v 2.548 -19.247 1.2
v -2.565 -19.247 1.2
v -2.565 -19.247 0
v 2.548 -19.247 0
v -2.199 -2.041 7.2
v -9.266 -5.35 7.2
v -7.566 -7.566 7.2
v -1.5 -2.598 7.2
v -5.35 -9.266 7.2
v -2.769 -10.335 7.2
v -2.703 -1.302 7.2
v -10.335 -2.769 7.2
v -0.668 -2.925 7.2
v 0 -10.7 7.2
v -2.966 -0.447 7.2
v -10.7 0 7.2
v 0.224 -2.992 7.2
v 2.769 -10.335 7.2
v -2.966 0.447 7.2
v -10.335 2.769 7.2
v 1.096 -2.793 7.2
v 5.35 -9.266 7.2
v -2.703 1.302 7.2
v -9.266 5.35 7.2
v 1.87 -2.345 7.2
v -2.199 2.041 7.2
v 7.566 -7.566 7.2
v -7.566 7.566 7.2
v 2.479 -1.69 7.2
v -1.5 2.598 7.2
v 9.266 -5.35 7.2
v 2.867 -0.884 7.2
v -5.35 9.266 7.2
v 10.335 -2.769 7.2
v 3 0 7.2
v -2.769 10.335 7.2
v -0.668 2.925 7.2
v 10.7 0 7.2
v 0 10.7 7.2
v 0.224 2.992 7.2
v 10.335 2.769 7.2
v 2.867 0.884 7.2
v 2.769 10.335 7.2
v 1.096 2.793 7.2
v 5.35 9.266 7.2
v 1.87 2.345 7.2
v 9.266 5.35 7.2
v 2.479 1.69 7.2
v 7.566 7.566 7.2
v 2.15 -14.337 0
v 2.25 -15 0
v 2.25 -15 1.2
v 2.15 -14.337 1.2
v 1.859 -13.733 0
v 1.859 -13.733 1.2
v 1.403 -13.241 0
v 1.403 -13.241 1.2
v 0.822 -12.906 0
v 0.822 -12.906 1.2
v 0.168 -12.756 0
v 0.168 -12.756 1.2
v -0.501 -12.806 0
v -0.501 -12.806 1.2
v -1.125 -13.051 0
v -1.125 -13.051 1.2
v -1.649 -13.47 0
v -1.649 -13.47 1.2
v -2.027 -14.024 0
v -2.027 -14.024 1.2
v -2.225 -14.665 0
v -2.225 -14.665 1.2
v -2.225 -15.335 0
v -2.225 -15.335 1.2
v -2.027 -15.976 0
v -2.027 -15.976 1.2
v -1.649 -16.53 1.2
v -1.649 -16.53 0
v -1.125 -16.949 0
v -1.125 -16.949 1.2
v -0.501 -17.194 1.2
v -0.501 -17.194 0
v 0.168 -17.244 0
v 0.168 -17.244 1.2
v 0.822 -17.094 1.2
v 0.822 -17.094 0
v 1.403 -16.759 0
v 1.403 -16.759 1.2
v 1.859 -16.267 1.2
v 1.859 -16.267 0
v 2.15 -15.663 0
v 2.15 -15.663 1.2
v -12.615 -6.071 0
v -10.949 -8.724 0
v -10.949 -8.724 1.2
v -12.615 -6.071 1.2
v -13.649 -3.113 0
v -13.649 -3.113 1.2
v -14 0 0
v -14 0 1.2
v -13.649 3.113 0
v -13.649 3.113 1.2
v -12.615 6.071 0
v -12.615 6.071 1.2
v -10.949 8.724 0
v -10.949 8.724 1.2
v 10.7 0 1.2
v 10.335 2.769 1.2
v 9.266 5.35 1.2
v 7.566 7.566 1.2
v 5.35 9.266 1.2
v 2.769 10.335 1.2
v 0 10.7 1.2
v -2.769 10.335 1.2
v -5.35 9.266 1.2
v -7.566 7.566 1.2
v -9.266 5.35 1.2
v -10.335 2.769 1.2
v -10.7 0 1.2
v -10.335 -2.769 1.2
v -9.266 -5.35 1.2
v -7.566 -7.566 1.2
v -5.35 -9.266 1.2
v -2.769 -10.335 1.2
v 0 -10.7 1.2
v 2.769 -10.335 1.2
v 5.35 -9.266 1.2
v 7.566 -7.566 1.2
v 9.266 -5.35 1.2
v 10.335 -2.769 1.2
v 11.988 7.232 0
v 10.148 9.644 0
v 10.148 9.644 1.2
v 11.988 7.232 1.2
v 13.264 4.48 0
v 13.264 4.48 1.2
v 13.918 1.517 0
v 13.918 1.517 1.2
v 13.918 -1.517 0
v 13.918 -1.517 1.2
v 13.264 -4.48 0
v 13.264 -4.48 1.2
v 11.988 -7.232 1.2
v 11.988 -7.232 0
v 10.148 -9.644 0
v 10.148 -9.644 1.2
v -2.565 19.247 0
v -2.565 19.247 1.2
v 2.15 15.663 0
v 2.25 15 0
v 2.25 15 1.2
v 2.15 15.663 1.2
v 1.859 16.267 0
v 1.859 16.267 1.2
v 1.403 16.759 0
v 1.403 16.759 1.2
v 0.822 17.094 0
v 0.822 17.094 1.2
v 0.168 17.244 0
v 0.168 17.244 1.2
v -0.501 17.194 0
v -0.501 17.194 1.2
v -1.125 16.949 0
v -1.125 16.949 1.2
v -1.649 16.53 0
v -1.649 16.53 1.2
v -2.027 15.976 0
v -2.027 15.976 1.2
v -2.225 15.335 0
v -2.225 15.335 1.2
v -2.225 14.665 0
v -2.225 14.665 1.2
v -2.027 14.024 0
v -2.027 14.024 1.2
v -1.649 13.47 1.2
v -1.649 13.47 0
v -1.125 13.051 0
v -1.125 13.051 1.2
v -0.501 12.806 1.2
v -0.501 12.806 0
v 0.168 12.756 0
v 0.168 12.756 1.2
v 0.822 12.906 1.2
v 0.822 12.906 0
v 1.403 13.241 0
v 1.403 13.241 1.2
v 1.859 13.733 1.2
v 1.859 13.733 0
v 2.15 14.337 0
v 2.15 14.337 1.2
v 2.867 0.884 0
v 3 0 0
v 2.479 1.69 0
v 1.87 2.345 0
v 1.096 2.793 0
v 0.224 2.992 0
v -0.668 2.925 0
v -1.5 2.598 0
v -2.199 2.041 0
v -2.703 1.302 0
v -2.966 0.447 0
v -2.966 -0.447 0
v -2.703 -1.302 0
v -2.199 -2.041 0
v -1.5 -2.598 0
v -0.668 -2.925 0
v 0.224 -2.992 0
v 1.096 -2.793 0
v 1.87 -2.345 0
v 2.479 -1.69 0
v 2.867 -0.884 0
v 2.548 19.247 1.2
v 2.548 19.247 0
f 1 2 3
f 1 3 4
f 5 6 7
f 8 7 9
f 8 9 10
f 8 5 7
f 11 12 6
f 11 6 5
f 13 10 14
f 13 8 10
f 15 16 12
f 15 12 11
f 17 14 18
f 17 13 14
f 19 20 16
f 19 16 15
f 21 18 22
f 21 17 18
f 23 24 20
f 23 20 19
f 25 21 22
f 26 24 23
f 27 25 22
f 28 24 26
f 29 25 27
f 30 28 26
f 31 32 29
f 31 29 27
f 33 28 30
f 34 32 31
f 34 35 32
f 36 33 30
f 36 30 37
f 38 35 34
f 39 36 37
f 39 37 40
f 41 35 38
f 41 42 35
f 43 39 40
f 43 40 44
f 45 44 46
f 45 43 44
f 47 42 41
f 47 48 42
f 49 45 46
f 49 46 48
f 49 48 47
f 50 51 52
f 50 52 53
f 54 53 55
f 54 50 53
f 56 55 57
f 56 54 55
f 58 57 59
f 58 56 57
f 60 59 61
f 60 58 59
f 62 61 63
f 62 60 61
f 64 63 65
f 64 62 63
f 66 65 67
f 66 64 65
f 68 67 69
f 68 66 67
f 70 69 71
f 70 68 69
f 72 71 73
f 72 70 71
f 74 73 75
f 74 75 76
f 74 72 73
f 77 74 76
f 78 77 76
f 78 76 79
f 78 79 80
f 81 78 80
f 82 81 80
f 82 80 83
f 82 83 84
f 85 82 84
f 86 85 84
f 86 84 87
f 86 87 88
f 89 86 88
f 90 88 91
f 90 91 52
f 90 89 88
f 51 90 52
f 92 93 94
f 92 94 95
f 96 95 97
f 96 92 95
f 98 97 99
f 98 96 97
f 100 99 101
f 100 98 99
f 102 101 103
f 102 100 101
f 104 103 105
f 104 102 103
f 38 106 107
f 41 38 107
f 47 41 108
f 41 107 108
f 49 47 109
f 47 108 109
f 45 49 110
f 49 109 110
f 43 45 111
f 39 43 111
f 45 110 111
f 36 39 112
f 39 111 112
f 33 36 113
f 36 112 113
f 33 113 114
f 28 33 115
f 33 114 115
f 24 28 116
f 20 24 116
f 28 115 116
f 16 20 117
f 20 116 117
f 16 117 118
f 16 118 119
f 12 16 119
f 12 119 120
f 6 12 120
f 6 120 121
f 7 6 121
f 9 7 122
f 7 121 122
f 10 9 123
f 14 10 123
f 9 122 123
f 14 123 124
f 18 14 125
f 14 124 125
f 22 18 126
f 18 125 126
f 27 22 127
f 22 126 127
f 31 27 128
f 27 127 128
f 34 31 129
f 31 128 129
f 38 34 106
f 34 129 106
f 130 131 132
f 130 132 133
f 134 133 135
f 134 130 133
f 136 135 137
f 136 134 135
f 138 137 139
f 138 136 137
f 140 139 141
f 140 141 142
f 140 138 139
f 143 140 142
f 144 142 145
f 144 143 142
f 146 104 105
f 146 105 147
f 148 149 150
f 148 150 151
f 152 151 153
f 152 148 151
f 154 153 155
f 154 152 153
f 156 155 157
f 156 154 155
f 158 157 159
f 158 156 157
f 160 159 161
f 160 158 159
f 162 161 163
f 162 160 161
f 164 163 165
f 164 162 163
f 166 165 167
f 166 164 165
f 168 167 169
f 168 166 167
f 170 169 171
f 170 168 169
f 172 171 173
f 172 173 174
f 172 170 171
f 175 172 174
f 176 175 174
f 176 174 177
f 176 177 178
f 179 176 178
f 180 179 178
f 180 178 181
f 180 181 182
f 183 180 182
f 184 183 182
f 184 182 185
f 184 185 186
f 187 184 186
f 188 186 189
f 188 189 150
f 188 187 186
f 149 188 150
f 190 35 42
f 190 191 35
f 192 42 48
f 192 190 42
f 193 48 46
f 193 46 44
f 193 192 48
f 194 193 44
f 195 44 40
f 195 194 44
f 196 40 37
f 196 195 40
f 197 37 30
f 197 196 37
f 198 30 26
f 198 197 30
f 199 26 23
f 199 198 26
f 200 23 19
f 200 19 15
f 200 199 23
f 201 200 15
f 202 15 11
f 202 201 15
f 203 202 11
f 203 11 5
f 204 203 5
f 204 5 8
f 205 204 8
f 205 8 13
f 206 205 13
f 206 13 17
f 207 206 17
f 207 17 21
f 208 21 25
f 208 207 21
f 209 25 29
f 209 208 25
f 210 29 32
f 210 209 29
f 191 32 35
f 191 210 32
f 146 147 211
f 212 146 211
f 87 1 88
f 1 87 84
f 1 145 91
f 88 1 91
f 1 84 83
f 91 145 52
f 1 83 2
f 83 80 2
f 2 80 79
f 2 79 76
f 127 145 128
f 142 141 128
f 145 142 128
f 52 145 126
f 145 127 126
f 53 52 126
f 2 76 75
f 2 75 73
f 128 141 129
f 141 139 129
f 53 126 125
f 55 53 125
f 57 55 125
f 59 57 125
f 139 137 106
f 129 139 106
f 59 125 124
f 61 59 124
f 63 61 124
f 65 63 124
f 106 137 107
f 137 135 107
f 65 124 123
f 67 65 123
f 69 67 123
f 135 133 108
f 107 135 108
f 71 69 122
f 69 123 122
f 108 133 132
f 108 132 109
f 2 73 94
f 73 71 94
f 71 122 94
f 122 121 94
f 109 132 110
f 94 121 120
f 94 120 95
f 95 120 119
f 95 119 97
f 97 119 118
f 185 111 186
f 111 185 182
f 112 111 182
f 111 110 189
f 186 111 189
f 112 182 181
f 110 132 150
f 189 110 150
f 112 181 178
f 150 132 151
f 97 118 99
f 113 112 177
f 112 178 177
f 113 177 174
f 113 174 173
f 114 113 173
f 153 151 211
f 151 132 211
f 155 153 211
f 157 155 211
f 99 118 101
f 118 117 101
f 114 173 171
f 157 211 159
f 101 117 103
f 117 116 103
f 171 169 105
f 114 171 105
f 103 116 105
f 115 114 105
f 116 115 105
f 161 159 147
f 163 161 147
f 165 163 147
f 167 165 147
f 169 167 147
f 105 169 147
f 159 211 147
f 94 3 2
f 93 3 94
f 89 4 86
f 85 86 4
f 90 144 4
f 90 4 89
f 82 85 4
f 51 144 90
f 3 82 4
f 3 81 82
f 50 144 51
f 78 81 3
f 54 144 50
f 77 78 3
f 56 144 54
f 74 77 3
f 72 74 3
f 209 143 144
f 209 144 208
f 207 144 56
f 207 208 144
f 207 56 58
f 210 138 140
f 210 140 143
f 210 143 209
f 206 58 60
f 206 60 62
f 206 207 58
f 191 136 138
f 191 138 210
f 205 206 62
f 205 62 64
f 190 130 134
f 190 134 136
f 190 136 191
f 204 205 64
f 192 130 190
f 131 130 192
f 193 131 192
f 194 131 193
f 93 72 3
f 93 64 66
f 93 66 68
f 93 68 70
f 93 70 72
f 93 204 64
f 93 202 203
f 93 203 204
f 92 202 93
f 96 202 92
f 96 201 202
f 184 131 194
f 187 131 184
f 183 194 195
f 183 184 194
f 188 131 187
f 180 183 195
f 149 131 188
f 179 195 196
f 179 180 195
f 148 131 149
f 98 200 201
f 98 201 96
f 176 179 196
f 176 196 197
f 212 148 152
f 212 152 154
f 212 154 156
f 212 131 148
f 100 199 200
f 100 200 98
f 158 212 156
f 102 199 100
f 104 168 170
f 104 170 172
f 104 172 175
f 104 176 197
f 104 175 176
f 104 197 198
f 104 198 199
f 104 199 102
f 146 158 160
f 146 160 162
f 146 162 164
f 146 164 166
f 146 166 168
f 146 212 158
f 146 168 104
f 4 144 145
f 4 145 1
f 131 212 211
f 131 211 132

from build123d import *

# Parameters (mm, degrees)
SKETCH_1_R          = 2.25
SKETCH_1_R_2        = 3
EXTRUDE_1_DEPTH     = 1.2
SKETCH_2_R          = 10.7
SKETCH_2_R_2        = 3
EXTRUDE_2_DEPTH     = 6
CUT_EXTRUDE_1_DEPTH = 6


with BuildPart() as part:
    # ｽｹｯﾁ1 → ﾎﾞｽ - 押し出し1 (new body)
    with BuildSketch(Plane.XY):
        with BuildLine():
            Line((-10.949386038, 8.724158721), (0, 22.466349623))
            Line((0, 22.466349623), (10.148136548, 9.644445272))
            ThreePointArc((10.148136548, 9.644445272), (14, 0), (10.148136548, -9.644445272))
            Line((10.148136548, -9.644445272), (0, -22.466349623))
            Line((0, -22.466349623), (-10.949386038, -8.724158721))
            ThreePointArc((-10.949386038, -8.724158721), (-14, 0), (-10.949386038, 8.724158721))
        make_face()
        with Locations((0, 15)):
            Circle(SKETCH_1_R, mode=Mode.SUBTRACT)
        with Locations((0, -15)):
            Circle(SKETCH_1_R, mode=Mode.SUBTRACT)
        Circle(SKETCH_1_R_2, mode=Mode.SUBTRACT)
    extrude(amount=EXTRUDE_1_DEPTH)

    # ｽｹｯﾁ2 → ﾎﾞｽ - 押し出し2 (add)
    with BuildSketch(Plane.XY.offset(1.2)):
        Circle(SKETCH_2_R)
        Circle(SKETCH_2_R_2, mode=Mode.SUBTRACT)
    extrude(amount=EXTRUDE_2_DEPTH)

    # ｽｹｯﾁ3 → ｶｯﾄ - 押し出し1 (cut)
    with BuildSketch(Plane.XY.offset(1.2)):
        Polygon((-2.565036178, 19.24706256), (2.547965093, 19.24706256), (0, 22.466349623), align=None)
        Polygon((-2.565036178, -19.24706256), (2.547965093, -19.24706256), (0, -22.466349623), align=None)
    extrude(amount=-CUT_EXTRUDE_1_DEPTH, mode=Mode.SUBTRACT)


solid = part.part
